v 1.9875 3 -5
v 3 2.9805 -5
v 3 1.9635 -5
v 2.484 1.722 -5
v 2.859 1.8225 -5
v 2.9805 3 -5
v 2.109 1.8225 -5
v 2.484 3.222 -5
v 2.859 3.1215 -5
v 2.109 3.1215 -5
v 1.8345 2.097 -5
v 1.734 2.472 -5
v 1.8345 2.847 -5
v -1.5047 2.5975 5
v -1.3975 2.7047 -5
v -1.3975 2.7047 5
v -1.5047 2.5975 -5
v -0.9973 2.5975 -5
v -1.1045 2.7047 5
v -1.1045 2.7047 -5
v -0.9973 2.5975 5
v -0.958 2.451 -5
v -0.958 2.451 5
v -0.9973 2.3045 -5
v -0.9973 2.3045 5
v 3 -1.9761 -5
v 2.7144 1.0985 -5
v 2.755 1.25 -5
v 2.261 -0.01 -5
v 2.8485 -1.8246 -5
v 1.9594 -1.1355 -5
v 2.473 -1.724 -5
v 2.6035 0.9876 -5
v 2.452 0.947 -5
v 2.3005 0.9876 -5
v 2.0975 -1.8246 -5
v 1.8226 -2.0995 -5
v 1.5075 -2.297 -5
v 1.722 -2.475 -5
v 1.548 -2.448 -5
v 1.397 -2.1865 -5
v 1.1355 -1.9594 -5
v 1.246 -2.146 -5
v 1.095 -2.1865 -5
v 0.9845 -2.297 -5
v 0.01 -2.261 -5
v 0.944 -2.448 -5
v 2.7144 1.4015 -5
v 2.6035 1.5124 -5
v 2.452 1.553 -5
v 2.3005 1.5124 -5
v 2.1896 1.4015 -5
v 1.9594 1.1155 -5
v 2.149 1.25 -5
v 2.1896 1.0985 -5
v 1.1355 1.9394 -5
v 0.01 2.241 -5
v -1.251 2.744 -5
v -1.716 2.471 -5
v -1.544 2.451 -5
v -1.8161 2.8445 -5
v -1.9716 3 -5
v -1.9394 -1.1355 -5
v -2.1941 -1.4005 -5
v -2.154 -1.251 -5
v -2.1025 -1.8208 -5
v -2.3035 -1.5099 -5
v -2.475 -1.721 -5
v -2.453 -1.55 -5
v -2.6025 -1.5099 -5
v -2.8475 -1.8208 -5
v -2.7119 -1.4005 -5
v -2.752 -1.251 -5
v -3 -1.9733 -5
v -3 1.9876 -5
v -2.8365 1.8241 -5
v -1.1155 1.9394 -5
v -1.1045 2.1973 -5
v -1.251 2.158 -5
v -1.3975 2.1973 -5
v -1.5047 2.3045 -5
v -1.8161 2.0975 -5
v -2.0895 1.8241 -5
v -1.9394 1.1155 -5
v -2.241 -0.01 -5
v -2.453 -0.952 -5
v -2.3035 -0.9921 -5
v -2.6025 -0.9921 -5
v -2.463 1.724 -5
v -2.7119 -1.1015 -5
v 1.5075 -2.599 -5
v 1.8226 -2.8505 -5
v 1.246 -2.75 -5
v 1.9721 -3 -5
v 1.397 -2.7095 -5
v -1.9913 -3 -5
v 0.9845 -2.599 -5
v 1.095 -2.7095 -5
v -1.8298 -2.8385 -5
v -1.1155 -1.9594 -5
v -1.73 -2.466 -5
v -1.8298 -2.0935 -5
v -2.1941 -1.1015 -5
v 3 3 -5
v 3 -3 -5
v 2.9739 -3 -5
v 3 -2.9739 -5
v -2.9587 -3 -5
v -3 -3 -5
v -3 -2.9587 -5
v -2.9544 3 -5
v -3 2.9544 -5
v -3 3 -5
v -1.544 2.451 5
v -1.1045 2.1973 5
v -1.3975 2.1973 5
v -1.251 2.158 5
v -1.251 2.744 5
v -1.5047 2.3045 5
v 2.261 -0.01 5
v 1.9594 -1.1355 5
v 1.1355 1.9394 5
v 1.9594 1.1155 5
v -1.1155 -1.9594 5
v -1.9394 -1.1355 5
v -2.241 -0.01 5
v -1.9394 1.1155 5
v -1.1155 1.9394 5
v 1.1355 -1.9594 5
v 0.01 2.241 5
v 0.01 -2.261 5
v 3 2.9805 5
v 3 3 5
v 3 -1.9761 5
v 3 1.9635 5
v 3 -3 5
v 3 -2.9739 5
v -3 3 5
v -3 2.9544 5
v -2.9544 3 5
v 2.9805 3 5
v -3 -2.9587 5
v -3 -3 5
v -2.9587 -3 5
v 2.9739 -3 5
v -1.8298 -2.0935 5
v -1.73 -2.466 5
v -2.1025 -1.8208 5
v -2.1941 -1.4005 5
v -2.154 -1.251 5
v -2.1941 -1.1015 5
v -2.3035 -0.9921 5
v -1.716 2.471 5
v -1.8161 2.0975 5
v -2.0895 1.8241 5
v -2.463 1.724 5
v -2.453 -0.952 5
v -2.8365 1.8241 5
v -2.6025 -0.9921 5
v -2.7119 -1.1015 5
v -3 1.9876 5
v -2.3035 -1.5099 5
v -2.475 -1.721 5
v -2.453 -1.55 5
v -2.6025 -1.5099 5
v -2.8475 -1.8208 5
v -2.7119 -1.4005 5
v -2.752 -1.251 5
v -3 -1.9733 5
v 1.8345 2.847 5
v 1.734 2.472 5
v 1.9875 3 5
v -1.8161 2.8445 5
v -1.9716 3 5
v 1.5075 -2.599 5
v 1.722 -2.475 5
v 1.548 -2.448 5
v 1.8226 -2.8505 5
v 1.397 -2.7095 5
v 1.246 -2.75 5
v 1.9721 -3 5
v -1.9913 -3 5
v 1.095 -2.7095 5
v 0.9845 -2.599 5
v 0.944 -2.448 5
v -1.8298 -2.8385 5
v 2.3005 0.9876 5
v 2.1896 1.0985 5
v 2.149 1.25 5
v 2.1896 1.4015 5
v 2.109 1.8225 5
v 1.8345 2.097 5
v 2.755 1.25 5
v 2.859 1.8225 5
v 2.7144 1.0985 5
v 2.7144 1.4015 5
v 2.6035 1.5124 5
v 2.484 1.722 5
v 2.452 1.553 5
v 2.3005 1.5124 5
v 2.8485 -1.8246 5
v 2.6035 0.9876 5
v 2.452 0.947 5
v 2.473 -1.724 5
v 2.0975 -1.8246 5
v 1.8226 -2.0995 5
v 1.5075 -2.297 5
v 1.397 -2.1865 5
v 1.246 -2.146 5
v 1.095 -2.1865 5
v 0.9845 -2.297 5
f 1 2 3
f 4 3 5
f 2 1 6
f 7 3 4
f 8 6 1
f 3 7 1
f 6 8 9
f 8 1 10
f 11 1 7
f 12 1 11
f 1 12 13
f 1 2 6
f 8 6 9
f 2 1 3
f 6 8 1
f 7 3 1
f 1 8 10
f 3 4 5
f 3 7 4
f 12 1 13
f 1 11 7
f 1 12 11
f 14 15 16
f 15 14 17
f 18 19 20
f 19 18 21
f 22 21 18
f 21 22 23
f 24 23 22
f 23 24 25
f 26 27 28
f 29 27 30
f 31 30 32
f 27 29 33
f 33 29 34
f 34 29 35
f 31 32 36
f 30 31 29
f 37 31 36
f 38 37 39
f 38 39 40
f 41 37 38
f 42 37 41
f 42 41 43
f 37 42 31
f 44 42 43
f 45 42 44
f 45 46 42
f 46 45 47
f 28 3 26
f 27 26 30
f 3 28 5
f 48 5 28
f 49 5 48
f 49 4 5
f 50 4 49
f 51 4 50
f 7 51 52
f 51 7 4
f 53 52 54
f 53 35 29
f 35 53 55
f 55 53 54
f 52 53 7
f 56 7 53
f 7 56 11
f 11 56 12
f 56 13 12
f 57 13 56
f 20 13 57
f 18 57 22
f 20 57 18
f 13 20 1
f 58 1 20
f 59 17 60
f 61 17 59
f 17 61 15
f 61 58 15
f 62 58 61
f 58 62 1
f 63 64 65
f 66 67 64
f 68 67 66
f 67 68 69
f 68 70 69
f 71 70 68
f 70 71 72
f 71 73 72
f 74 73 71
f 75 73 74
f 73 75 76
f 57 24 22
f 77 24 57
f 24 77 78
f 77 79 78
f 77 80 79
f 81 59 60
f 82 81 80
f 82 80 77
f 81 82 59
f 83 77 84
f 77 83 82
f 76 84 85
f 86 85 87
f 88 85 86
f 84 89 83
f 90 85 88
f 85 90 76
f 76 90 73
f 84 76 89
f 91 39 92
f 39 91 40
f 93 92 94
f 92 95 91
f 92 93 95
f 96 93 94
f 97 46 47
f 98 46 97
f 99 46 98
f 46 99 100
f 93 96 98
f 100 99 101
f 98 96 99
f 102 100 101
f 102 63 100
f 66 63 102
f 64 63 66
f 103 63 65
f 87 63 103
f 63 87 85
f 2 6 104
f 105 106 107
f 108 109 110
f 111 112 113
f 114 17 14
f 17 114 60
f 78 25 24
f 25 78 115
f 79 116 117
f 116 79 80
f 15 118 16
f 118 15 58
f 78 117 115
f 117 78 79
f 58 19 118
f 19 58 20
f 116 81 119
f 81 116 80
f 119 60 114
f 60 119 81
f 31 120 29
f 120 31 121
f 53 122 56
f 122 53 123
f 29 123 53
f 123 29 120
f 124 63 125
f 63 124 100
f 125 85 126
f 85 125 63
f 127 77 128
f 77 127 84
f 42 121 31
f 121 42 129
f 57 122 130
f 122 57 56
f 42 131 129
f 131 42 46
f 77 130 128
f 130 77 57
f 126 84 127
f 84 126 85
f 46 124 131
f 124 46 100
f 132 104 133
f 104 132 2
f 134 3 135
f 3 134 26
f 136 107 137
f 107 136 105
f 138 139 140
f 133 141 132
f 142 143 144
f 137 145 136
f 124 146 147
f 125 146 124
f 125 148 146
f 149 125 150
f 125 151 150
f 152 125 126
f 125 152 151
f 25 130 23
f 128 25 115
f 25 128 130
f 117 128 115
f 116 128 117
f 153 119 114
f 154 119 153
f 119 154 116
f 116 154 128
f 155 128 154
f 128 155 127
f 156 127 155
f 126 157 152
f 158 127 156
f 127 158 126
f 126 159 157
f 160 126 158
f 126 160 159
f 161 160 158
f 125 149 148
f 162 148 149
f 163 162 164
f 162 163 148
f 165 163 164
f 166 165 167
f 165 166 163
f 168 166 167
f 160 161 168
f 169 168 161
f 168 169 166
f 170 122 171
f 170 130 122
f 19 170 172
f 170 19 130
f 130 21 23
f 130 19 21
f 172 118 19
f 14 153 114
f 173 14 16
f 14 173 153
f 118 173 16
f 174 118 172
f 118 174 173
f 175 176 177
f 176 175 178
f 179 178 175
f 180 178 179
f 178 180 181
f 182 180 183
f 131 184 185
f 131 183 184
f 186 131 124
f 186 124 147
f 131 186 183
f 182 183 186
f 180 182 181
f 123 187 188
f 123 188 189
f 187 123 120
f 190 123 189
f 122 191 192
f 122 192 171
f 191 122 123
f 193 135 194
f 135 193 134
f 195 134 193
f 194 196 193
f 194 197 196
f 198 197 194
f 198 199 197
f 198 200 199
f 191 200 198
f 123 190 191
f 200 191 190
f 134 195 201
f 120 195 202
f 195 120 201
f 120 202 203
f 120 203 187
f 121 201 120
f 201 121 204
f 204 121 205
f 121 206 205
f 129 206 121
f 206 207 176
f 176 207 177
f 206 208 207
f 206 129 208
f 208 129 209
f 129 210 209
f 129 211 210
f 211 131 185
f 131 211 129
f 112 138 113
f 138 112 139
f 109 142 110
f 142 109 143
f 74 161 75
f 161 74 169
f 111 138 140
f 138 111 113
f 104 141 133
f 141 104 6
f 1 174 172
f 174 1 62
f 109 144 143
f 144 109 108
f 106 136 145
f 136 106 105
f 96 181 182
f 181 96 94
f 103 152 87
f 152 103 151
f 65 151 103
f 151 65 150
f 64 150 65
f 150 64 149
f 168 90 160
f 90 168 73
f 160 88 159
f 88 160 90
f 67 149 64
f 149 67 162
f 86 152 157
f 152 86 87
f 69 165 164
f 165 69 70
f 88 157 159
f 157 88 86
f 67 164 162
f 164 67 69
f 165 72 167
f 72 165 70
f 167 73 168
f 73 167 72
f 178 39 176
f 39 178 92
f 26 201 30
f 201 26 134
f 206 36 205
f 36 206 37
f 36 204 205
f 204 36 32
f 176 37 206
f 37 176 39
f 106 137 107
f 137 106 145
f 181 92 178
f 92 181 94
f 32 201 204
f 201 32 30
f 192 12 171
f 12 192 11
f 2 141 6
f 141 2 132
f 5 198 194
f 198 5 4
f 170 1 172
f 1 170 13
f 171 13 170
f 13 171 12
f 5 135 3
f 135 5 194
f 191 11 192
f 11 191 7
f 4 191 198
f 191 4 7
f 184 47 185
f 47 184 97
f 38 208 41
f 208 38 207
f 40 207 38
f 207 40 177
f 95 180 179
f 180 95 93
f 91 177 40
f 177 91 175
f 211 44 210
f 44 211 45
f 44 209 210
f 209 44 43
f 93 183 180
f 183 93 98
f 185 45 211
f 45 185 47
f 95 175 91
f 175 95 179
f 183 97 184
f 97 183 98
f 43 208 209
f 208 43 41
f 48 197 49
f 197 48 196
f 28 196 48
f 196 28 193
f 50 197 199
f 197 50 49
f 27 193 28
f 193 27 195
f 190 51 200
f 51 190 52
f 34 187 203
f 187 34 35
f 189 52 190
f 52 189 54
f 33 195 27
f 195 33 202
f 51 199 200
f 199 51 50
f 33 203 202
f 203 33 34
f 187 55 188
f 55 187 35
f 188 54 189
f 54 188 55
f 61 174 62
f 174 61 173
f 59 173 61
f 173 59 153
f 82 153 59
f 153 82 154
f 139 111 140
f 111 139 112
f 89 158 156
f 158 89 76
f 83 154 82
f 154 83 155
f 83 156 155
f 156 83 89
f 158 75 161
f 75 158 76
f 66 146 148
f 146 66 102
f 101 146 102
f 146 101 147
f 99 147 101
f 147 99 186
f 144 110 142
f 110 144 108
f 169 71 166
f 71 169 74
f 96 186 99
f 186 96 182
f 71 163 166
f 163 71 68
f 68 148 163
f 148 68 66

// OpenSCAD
intersection() {
translate([-3.6, -3.6, -6]) cube(size = [7.2, 7.2, 12], center = false);
union() {
intersection() {
translate([-3, -3, -5]) cube(size = [6, 21.25, 10], center = false);
translate([2.484, 2.472, -18.25])
cylinder(h = 13.25, r1 = 0.75, r2 = 0.75, center = false, $fn = 12);
}
intersection() {
difference() {
translate([-3, -3, -5]) cube(size = [6, 6, 10], center = false);
union() {
translate([-1.251, 2.451, -5])
cylinder(h = 23.25, r1 = 0.293, r2 = 0.293, center = false, $fn = 12);
translate([0.01, -0.01, -18.25])
cylinder(h = 36.5, r1 = 2.251, r2 = 2.251, center = false, $fn = 12);
}
}
difference() {
difference() {
difference() {
translate([0, 0, 0]) sphere(r = 54.75, $fn = 12);
translate([-2.453, -1.251, -18.25])
cylinder(h = 23.25, r1 = 0.299, r2 = 0.299, center = false, $fn = 12);
}
union() {
translate([2.473, -2.475, -18.25])
cylinder(h = 36.5, r1 = 0.751, r2 = 0.751, center = false, $fn = 12);
translate([2.484, 2.472, -18.25])
cylinder(h = 23.25, r1 = 0.75, r2 = 0.75, center = false, $fn = 12);
}
}
union() {
translate([1.246, -2.448, -18.25])
cylinder(h = 23.25, r1 = 0.302, r2 = 0.302, center = false, $fn = 12);
translate([2.452, 1.25, -18.25])
cylinder(h = 23.25, r1 = 0.303, r2 = 0.303, center = false, $fn = 12);
translate([-2.463, 2.471, -5])
cylinder(h = 10, r1 = 0.747, r2 = 0.747, center = false, $fn = 12);
translate([-2.475, -2.466, -5])
cylinder(h = 23.25, r1 = 0.745, r2 = 0.745, center = false, $fn = 12);
}
}
}
}
}
